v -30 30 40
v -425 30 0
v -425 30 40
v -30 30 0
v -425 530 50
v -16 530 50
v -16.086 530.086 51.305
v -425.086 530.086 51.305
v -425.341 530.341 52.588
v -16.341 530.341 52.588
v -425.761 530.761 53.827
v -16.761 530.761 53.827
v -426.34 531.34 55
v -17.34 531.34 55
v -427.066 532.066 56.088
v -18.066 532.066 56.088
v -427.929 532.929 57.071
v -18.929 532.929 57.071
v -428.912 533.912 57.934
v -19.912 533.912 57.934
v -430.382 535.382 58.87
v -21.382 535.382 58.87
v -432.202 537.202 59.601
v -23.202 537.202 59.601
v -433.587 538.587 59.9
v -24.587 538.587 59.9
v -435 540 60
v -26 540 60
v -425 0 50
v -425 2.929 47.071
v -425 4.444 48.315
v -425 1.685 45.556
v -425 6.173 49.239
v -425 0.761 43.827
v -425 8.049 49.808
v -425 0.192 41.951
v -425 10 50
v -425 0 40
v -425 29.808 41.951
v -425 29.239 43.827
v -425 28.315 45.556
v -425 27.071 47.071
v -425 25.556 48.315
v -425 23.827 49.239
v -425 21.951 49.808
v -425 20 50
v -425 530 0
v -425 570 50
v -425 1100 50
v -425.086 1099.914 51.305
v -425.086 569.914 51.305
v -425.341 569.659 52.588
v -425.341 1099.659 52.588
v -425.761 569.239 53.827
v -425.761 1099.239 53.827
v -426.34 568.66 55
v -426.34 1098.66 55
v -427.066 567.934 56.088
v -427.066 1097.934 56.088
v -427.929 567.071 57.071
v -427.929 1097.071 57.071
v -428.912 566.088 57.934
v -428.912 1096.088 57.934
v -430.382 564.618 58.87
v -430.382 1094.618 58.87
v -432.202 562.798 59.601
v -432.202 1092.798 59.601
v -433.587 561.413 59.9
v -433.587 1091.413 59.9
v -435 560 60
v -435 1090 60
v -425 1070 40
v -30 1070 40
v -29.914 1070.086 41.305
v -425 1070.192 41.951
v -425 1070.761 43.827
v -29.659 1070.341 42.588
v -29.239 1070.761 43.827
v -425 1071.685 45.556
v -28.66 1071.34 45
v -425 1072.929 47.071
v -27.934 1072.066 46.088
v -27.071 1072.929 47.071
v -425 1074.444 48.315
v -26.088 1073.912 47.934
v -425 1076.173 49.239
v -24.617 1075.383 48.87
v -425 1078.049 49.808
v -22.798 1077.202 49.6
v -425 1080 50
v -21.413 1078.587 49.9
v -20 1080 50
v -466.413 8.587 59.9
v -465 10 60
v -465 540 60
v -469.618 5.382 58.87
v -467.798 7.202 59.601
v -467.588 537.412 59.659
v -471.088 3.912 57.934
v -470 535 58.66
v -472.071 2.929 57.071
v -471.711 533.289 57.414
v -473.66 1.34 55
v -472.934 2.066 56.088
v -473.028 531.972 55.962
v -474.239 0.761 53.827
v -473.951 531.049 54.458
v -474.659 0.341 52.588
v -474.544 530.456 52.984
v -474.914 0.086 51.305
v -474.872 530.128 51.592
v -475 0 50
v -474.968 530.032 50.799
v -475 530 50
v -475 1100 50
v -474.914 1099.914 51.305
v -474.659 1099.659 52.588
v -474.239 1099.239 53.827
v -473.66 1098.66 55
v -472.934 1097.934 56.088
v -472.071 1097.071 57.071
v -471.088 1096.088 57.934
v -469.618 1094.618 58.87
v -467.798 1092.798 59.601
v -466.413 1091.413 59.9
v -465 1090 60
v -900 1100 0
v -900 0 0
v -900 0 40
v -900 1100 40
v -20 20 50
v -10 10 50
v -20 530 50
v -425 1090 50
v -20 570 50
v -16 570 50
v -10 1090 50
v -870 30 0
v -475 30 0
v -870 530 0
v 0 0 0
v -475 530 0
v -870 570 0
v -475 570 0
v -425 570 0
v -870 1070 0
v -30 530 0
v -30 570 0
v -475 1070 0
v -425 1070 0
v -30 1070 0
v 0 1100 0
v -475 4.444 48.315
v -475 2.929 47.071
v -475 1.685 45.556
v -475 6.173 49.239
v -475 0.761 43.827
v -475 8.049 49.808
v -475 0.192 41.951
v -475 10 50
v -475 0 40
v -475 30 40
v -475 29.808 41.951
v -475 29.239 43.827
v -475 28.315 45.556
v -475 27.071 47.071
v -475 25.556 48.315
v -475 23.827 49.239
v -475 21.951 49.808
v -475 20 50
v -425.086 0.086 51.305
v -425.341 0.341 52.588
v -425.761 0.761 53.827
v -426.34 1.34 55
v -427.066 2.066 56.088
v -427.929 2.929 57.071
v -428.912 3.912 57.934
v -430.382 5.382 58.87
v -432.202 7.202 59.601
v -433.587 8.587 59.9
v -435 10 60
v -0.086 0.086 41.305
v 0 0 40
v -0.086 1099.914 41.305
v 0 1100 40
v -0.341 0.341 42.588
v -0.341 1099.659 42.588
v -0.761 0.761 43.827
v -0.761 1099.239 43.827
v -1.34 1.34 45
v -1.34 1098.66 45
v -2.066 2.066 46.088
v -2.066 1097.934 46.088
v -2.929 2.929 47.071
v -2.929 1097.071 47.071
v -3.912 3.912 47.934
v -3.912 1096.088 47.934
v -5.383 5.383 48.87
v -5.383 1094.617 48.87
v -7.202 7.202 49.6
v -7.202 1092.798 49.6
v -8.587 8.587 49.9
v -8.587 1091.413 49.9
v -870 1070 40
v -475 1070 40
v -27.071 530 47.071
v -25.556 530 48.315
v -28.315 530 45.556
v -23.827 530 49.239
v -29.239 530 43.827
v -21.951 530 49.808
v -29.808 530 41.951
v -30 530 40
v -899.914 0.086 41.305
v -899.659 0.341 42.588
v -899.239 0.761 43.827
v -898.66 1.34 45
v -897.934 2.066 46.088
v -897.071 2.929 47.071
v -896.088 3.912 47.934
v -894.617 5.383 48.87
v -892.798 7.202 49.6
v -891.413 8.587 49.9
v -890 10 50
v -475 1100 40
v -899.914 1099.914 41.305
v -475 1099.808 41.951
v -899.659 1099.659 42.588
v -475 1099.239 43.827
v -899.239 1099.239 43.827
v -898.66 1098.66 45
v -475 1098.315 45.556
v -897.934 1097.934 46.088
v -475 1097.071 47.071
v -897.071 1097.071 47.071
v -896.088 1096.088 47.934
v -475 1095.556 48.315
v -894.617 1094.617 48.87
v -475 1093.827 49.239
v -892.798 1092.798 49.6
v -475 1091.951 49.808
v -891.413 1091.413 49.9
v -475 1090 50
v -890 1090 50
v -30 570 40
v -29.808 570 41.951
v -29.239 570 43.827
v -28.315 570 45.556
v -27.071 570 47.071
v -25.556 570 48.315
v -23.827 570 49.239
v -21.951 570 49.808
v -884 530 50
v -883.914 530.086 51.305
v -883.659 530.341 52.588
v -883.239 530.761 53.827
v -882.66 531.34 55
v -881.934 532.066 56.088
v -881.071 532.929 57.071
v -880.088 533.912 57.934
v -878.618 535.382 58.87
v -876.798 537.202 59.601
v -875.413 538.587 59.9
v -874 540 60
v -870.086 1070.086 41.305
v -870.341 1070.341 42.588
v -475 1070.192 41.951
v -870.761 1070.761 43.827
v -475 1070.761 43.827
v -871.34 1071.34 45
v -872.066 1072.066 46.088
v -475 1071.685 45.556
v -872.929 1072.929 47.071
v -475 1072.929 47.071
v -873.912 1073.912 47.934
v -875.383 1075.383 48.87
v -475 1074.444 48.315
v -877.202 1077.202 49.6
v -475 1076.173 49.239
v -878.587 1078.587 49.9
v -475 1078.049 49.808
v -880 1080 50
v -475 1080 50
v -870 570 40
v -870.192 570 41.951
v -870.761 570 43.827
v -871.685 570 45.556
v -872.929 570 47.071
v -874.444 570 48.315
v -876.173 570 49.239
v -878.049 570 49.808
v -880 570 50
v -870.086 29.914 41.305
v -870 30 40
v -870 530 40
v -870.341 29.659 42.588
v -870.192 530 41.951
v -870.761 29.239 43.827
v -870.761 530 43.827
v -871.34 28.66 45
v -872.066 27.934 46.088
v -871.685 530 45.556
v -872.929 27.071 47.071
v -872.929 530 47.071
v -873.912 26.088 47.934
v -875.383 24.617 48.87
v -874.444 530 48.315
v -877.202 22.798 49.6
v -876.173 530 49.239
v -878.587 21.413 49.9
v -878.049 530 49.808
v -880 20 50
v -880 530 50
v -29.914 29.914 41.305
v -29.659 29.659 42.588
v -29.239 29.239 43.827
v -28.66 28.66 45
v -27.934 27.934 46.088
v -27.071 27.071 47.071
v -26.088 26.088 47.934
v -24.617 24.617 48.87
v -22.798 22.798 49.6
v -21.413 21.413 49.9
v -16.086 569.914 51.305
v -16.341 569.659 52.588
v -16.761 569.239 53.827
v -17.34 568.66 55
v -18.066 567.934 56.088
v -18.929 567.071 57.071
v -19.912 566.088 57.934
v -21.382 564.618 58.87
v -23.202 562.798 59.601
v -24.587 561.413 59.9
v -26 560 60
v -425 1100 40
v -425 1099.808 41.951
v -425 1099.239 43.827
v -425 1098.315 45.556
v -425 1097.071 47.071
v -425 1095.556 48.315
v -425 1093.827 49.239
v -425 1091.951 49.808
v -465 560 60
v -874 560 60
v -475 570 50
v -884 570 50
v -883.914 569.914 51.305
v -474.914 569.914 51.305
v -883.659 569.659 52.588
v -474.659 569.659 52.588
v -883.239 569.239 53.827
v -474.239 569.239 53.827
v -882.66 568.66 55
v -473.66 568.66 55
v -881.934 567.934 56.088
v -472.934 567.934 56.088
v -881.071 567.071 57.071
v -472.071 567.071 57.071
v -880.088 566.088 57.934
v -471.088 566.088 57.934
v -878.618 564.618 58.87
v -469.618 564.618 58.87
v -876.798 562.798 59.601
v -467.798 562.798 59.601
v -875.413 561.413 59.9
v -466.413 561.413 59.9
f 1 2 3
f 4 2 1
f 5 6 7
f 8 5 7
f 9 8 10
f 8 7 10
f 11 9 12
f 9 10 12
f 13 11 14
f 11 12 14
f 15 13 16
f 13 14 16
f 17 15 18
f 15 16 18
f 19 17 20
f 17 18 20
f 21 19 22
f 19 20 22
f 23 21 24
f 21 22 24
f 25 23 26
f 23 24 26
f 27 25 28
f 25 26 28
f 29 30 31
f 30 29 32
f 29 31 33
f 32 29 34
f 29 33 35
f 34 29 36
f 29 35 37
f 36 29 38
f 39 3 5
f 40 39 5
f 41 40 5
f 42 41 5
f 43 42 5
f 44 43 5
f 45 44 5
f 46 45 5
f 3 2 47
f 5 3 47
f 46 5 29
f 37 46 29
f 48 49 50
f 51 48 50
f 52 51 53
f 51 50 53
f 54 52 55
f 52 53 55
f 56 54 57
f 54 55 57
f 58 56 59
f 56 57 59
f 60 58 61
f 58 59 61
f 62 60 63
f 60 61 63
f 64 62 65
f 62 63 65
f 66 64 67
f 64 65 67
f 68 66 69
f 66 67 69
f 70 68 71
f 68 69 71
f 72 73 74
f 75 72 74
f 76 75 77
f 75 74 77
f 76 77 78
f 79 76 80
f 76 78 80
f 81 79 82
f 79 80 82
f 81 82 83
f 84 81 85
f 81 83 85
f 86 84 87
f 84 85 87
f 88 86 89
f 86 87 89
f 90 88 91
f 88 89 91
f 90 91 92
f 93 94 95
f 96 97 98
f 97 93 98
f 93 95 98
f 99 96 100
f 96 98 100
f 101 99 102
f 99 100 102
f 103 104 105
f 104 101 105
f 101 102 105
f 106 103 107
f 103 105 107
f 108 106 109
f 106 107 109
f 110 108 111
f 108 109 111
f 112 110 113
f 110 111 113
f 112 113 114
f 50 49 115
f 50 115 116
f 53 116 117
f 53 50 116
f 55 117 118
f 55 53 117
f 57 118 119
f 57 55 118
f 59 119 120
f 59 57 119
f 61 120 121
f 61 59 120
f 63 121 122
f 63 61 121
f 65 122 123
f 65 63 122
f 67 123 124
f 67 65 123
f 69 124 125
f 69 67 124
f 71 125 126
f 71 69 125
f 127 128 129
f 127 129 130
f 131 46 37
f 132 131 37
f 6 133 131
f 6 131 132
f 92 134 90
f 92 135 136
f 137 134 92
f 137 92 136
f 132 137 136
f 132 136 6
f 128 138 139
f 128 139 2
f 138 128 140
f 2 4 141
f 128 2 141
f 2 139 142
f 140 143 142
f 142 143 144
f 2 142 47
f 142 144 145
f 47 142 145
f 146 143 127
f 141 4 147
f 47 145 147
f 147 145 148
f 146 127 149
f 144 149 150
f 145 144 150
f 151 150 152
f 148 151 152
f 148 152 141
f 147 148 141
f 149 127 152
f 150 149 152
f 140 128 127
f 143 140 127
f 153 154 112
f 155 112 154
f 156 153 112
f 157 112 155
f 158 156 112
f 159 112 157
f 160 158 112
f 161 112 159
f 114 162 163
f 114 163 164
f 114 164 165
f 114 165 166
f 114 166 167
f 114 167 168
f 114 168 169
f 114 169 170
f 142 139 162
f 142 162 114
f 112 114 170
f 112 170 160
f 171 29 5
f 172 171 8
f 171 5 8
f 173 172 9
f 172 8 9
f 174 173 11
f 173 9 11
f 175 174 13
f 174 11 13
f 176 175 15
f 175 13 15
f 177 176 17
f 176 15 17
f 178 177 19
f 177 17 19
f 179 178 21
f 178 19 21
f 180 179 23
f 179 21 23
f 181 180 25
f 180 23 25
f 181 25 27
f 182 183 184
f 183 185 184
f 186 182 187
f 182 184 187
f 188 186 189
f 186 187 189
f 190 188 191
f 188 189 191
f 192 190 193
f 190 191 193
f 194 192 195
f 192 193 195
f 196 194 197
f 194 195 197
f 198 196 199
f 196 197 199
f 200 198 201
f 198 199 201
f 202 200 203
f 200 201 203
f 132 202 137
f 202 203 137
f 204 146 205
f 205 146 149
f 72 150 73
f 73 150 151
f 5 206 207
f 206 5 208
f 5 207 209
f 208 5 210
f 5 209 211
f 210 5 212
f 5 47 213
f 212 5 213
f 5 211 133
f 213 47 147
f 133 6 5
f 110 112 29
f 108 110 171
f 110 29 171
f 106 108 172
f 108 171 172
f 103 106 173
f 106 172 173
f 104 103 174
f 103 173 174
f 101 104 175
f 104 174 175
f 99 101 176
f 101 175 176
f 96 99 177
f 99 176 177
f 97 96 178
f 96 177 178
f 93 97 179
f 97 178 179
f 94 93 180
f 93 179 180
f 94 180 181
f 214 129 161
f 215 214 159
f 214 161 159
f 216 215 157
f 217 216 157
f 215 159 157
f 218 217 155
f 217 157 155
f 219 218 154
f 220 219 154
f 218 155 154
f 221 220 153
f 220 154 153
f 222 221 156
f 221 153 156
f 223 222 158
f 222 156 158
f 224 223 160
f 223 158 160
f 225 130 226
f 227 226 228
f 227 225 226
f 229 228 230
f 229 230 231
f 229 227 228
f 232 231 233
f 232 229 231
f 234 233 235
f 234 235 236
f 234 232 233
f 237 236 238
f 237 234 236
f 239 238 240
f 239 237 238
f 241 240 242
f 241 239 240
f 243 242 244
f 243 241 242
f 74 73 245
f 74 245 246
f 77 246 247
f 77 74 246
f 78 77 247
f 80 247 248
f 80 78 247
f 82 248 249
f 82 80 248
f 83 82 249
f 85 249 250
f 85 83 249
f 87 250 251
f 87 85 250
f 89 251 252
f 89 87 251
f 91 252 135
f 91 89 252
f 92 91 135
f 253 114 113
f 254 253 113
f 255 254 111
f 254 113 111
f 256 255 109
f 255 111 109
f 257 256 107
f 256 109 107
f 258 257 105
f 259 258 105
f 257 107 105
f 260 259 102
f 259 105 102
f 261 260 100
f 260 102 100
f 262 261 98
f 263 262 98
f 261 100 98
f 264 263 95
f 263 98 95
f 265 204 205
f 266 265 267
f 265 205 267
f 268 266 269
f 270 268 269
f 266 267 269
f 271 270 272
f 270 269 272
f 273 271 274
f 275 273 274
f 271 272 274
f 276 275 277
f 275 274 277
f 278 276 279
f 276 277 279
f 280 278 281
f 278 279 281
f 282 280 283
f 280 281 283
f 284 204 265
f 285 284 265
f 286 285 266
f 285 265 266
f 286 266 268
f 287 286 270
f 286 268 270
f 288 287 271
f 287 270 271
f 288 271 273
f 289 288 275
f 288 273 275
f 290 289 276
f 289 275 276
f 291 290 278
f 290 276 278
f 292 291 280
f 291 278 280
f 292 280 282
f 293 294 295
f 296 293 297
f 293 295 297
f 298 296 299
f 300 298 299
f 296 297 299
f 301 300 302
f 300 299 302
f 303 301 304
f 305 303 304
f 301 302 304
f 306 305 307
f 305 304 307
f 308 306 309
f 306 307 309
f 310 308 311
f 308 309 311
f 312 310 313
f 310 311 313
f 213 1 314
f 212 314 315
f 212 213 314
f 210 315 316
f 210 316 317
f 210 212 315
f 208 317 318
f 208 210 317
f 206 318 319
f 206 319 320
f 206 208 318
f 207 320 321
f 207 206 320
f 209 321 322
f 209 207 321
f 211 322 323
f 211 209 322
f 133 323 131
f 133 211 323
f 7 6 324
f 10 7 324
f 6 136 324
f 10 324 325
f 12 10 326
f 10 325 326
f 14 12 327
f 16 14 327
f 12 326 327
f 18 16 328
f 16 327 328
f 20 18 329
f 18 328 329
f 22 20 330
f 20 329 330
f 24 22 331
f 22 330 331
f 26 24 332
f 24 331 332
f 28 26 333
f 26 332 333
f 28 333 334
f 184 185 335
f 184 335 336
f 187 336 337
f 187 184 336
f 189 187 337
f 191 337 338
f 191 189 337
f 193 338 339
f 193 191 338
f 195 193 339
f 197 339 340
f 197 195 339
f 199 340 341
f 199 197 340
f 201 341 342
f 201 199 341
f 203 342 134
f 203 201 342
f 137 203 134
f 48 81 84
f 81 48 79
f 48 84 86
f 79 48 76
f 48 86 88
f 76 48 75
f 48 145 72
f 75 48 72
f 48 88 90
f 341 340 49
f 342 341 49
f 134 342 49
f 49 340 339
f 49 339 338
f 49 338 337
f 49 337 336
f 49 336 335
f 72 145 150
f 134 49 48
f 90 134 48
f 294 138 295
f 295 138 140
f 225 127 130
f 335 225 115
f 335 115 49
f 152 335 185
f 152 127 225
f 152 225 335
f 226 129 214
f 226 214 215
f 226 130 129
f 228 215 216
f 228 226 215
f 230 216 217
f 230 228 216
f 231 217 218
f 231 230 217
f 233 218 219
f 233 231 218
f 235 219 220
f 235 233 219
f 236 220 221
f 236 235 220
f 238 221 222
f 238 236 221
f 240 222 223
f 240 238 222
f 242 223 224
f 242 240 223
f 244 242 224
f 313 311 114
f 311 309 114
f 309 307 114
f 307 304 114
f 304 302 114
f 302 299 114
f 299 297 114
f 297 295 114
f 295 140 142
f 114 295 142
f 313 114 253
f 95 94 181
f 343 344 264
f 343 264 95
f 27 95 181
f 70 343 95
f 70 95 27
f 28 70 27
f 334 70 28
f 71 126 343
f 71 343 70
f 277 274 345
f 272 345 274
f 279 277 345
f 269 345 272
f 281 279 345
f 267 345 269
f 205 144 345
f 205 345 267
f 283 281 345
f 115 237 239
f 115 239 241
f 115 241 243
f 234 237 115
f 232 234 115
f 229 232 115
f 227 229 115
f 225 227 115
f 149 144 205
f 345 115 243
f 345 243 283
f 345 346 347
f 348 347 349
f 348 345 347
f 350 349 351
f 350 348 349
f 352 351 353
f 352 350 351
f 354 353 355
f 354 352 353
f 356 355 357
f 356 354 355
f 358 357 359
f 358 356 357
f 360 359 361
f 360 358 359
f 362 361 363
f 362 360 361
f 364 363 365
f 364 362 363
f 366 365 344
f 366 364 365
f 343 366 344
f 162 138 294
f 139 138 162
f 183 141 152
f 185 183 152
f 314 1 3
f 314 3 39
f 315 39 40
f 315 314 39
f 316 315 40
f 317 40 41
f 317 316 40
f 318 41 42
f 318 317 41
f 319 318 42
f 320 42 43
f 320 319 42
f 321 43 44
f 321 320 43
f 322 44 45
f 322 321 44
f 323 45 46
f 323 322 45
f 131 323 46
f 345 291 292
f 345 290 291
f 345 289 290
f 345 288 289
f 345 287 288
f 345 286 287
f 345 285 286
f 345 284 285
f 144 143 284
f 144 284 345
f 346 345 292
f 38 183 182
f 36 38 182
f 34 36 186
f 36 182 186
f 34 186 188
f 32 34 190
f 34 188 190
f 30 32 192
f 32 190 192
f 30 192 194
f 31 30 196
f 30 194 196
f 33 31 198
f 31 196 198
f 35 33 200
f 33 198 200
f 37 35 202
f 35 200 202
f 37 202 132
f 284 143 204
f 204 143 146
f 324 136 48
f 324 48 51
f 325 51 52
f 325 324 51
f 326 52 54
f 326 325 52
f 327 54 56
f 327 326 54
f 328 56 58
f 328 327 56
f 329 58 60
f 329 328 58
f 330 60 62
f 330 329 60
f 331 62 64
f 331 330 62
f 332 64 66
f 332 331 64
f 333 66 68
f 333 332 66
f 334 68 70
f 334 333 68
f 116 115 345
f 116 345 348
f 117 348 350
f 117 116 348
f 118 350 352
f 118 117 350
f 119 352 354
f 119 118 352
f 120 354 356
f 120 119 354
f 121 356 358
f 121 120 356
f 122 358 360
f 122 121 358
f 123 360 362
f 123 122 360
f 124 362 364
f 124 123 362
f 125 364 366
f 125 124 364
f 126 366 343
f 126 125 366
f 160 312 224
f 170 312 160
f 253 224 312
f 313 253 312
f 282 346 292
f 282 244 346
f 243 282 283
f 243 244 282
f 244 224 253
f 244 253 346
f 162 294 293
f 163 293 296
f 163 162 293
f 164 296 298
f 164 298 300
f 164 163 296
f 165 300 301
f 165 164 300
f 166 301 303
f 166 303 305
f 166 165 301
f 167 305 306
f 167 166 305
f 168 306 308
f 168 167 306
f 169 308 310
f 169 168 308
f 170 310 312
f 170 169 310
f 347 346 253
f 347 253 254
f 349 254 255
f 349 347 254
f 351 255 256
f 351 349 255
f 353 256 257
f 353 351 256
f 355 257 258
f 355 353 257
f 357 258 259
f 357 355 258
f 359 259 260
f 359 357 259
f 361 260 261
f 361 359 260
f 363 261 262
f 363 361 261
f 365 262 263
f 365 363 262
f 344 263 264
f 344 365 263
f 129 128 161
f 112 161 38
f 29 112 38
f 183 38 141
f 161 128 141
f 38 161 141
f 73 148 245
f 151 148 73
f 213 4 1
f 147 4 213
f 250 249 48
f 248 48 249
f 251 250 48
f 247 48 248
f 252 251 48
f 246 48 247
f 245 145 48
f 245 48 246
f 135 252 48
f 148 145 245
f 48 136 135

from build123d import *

# Parameters (mm, degrees)
SKETCH1_W           = 900
SKETCH1_H           = 1100
SKETCH1_W_2         = 840
SKETCH1_H_2         = 1040
BOSS_EXTRUDE1_DEPTH = 50
FILLET1_R           = 10
SKETCH2_W           = 50
SKETCH2_H           = 1100
SKETCH2_W_2         = 868
SKETCH2_H_2         = 40
BOSS_EXTRUDE2_DEPTH = 60
FILLET2_R           = 10


with BuildPart() as part:
    # Sketch1 → Boss-Extrude1 (new body)
    with BuildSketch(Plane.XY):
        with Locations((-450, 550)):
            Rectangle(SKETCH1_W, SKETCH1_H)
        with Locations((-450, 550)):
            Rectangle(SKETCH1_W_2, SKETCH1_H_2, mode=Mode.SUBTRACT)
    extrude(amount=BOSS_EXTRUDE1_DEPTH)

    # Fillet1
    fillet1_edges = [part.edges().sort_by_distance(p)[0] for p in [
        (-900, 550, 50),
        (-450, 0, 50),
        (-450, 30, 50),
        (-30, 550, 50),
        (-450, 1070, 50),
        (-870, 550, 50),
        (0, 550, 50),
        (-450, 1100, 50),
    ]]
    fillet(fillet1_edges, radius=FILLET1_R)

    # Sketch2 → Boss-Extrude2 (add)
    with BuildSketch(Plane.XY):
        with Locations((-450, 550)):
            Rectangle(SKETCH2_W, SKETCH2_H)
        with Locations((-450, 550)):
            Rectangle(SKETCH2_W_2, SKETCH2_H_2)
    extrude(amount=BOSS_EXTRUDE2_DEPTH)

    # Fillet2
    fillet2_edges = [part.edges().sort_by_distance(p)[0] for p in [
        (-450, 0, 60),
        (-475, 265, 60),
        (-679.5, 530, 60),
        (-884, 550, 60),
        (-679.5, 570, 60),
        (-475, 835, 60),
        (-450, 1100, 60),
        (-425, 835, 60),
        (-220.5, 570, 60),
        (-16, 550, 60),
        (-220.5, 530, 60),
        (-425, 265, 60),
    ]]
    fillet(fillet2_edges, radius=FILLET2_R - 0.0001)  # a hair under: the kernel refuses the full size


solid = part.part
